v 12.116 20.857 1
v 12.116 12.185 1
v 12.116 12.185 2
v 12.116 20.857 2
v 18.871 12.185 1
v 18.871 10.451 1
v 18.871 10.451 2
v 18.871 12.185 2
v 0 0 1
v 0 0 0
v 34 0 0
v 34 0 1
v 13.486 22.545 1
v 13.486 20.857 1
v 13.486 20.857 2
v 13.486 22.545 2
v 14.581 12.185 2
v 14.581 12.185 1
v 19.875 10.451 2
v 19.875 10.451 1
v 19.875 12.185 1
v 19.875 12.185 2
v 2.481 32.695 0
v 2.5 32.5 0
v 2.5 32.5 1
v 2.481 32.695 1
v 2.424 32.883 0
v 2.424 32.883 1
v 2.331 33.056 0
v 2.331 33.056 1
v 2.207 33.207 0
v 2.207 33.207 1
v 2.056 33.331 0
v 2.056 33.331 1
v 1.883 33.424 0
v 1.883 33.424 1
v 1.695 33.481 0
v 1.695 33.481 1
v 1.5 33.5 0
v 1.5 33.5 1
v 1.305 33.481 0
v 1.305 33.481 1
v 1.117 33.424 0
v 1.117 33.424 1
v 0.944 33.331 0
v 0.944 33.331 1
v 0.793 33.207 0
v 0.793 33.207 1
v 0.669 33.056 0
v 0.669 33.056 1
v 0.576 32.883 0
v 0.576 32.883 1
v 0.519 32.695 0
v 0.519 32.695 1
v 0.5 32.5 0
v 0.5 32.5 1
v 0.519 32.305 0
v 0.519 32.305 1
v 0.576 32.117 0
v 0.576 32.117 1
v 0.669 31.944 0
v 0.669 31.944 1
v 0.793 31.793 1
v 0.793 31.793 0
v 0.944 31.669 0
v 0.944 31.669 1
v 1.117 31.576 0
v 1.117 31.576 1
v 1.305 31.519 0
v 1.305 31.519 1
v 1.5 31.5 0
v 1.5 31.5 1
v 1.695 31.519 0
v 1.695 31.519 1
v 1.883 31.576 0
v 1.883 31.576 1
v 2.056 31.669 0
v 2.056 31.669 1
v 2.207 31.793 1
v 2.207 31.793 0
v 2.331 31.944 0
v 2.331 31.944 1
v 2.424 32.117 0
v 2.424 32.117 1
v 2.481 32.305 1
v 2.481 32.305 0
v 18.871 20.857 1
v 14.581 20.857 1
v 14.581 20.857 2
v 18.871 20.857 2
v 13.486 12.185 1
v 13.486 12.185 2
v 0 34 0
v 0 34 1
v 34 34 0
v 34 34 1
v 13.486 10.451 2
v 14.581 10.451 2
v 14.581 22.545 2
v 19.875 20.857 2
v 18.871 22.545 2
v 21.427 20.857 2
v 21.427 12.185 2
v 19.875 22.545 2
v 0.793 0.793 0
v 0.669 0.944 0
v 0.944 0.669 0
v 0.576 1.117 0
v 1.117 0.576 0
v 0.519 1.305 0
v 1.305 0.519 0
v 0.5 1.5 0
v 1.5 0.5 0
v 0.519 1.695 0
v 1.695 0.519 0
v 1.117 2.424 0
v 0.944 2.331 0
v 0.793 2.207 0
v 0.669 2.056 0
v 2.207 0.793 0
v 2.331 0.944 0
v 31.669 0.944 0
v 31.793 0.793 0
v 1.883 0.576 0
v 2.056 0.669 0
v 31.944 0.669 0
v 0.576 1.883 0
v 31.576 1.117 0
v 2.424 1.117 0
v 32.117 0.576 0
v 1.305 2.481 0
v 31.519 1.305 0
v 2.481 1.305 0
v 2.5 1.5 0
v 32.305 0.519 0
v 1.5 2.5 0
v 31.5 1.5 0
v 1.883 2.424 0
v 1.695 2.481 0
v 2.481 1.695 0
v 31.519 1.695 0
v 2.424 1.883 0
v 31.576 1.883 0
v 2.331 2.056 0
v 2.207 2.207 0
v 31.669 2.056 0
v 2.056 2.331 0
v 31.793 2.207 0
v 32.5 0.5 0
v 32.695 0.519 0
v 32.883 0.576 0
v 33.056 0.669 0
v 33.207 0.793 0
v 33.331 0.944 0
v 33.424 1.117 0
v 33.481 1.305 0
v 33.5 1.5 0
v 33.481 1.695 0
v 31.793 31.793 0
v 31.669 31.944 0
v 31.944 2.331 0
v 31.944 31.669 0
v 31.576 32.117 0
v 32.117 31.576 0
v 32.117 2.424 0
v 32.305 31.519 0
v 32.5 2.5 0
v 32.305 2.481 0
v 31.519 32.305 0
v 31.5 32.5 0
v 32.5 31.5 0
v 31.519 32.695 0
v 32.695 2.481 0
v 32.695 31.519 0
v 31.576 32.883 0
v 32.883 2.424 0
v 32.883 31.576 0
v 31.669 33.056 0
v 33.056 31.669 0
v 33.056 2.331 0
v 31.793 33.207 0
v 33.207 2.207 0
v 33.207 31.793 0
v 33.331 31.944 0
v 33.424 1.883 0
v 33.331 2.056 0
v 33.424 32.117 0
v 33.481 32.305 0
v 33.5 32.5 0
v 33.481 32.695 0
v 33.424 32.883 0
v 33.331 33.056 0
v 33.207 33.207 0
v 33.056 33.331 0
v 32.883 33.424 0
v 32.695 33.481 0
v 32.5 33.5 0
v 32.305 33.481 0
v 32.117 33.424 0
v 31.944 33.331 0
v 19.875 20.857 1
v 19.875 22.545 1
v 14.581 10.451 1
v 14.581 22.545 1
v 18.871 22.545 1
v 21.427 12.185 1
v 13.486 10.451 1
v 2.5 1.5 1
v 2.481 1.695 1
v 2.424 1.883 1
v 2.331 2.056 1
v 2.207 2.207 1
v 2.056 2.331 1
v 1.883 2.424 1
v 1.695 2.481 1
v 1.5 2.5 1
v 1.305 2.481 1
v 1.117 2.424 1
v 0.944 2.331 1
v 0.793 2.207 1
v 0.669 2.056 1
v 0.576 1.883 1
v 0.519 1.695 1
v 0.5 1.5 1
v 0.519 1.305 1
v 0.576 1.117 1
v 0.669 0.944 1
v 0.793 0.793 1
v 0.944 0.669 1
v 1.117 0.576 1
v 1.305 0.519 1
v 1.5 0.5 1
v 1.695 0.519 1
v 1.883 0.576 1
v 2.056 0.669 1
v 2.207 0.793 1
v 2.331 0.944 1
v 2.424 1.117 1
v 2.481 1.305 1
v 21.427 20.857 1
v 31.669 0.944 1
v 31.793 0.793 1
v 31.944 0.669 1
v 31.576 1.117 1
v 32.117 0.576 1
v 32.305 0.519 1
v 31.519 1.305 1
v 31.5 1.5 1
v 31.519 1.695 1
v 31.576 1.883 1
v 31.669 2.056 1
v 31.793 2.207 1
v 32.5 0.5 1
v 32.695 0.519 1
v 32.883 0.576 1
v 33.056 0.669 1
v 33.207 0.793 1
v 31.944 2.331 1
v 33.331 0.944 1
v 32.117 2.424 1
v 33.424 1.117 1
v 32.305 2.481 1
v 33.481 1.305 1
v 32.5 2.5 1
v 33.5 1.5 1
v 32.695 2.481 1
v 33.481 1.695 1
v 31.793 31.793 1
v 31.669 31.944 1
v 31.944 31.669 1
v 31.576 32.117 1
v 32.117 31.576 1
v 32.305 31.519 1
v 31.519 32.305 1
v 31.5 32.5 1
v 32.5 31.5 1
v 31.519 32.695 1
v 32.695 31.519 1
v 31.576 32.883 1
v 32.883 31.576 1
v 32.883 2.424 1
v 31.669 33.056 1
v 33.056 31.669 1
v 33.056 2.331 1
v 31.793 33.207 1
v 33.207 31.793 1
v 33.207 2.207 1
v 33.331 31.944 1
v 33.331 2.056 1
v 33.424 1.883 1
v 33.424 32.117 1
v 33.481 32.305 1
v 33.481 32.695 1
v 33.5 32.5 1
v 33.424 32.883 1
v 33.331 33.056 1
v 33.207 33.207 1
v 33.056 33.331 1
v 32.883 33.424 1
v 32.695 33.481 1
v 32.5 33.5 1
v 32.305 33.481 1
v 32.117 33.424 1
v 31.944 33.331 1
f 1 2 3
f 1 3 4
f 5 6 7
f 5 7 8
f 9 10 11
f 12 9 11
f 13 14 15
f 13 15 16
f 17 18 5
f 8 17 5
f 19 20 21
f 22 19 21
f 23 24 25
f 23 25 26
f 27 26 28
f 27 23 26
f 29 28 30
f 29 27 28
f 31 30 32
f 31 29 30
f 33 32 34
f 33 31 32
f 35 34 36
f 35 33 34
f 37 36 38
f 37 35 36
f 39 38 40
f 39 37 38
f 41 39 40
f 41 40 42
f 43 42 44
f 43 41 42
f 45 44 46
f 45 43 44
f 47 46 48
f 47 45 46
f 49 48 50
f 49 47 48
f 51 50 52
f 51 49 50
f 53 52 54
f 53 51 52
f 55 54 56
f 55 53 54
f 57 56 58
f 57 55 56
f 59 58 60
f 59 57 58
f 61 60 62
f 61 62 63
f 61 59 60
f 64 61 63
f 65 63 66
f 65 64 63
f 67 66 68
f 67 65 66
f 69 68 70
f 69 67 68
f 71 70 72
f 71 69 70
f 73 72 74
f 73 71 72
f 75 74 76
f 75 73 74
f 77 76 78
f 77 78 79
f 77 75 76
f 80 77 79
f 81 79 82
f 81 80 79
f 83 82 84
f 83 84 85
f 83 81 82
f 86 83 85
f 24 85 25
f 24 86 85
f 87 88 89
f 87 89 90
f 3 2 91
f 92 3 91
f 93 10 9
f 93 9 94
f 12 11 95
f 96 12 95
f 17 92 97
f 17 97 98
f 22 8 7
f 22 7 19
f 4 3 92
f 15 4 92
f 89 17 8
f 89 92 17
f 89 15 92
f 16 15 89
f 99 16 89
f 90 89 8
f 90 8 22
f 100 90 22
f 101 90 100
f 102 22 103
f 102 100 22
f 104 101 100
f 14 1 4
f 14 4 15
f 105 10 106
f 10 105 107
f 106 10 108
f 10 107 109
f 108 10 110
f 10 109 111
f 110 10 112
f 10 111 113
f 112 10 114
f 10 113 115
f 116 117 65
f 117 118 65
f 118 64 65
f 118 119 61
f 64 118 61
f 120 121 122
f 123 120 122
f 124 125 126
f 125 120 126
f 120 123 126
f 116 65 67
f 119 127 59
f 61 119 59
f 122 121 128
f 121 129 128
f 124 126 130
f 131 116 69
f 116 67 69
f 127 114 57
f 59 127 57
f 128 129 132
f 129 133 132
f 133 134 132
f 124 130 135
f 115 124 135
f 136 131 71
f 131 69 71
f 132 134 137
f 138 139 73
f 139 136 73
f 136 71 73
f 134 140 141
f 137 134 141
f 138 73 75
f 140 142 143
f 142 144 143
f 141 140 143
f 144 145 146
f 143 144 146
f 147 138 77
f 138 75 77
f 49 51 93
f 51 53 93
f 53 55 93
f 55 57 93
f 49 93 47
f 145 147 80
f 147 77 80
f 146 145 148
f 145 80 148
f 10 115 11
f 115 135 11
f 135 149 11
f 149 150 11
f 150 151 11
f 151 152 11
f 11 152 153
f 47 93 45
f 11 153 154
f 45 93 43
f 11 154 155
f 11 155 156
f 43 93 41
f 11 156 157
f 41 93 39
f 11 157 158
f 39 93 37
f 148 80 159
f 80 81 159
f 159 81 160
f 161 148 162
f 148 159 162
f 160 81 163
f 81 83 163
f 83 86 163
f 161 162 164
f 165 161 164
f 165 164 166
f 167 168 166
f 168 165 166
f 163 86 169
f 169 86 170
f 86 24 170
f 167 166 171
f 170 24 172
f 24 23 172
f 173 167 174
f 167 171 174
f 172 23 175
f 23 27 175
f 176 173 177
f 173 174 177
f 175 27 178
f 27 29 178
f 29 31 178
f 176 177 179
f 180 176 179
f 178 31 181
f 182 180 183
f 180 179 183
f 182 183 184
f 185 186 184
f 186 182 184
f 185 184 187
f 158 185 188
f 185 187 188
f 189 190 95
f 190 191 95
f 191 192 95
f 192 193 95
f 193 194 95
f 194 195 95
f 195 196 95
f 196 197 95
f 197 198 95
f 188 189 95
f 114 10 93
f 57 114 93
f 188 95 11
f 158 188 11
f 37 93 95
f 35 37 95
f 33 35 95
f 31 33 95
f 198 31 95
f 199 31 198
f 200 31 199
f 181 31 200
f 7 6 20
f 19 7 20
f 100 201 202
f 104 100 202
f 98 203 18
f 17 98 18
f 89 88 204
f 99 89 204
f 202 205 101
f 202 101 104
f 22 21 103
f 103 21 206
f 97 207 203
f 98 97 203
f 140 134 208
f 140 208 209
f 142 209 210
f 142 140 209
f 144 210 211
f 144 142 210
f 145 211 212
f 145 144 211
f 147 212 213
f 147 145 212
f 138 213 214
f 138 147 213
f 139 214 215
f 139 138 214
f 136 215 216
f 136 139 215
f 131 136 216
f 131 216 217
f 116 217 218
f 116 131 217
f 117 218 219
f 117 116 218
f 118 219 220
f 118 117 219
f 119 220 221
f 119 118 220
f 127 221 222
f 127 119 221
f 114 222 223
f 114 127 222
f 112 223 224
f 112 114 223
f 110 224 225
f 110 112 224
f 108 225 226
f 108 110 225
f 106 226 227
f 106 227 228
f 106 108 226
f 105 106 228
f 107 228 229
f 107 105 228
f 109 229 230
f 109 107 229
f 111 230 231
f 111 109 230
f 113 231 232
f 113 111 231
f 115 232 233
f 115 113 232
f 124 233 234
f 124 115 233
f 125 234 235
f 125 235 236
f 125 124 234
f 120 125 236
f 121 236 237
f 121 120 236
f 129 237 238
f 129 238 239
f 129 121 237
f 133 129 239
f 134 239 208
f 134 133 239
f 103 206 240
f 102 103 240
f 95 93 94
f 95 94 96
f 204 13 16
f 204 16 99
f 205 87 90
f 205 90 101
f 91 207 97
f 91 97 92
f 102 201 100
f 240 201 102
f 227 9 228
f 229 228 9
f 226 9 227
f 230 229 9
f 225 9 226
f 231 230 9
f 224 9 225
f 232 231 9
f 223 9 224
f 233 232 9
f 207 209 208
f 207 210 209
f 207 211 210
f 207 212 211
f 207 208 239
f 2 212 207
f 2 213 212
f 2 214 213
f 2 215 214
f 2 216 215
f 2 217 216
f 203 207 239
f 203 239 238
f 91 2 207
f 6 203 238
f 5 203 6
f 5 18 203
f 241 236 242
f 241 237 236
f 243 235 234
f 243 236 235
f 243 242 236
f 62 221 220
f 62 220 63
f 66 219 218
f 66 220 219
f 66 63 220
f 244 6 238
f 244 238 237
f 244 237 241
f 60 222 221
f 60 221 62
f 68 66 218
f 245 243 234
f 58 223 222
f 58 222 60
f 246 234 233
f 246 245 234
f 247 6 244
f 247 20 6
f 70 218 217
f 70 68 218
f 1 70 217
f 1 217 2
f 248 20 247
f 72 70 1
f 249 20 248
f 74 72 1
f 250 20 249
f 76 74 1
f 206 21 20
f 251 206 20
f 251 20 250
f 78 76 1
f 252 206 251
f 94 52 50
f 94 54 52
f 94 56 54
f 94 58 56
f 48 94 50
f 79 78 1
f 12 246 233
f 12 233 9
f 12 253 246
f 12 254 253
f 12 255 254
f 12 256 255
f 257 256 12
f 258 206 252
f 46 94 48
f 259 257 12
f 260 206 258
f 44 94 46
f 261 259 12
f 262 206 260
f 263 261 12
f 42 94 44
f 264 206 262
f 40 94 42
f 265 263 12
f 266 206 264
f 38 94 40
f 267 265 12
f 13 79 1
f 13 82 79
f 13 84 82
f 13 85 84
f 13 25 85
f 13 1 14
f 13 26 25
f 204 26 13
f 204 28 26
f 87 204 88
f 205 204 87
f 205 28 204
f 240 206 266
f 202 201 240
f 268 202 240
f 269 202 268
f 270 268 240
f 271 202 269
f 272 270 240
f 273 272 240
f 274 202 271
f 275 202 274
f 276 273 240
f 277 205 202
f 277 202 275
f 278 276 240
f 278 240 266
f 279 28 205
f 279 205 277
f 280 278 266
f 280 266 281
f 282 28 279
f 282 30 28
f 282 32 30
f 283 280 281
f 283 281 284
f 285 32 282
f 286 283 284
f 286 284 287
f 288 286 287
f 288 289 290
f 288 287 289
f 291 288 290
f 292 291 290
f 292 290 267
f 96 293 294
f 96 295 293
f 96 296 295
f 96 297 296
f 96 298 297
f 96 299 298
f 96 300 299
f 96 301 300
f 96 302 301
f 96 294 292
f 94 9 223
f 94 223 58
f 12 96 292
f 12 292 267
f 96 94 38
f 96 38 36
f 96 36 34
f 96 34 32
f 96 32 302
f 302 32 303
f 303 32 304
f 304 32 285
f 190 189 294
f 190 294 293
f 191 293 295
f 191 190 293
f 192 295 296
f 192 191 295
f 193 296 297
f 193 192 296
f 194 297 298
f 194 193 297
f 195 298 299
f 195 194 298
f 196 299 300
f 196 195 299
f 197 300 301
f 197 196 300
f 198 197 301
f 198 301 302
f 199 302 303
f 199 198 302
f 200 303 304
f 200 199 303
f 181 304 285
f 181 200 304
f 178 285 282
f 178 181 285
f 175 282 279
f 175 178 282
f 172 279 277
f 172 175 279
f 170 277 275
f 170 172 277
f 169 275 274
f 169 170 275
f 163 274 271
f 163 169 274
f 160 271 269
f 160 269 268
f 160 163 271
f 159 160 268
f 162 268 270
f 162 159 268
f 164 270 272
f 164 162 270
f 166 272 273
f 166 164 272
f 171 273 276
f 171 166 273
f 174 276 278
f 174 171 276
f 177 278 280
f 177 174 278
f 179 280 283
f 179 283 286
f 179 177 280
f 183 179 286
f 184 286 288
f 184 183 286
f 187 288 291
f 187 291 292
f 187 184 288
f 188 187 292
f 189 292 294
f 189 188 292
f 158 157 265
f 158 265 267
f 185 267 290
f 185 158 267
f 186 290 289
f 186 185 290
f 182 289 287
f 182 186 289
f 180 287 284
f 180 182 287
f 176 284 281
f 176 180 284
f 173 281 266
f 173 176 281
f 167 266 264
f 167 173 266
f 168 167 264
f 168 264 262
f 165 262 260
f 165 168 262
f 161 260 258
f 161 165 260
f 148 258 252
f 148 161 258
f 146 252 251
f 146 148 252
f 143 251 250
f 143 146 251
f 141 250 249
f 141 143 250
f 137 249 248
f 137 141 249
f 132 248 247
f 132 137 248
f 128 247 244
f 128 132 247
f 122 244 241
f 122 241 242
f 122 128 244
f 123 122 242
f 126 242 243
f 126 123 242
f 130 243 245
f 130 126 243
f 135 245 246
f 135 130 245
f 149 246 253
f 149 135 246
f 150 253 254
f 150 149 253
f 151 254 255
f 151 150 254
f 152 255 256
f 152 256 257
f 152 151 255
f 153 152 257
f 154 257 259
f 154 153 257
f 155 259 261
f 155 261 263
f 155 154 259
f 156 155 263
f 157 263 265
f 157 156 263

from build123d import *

# Parameters (mm, degrees)
CROQUIS1_W              = 34
CROQUIS1_H              = 34
CROQUIS1_R              = 1
SALIENTE_EXTRUIR1_DEPTH = 1
CROQUIS2_W              = 9.310717014
CROQUIS2_H              = 8.671746239
CROQUIS2_W_2            = 1.095378472
CROQUIS2_H_2            = 1.688708478
CROQUIS2_W_3            = 1.004096933
CROQUIS2_H_3            = 1.734349248
SALIENTE_EXTRUIR2_DEPTH = 1


with BuildPart() as part:
    # Croquis1 → Saliente-Extruir1 (new body)
    with BuildSketch(Plane.XY):
        with Locations((17, 17)):
            Rectangle(CROQUIS1_W, CROQUIS1_H)
        with Locations((1.5, 32.5)):
            Circle(CROQUIS1_R, mode=Mode.SUBTRACT)
        with Locations((32.5, 32.5)):
            Circle(CROQUIS1_R, mode=Mode.SUBTRACT)
        with Locations((1.5, 1.5)):
            Circle(CROQUIS1_R, mode=Mode.SUBTRACT)
        with Locations((32.5, 1.5)):
            Circle(CROQUIS1_R, mode=Mode.SUBTRACT)
    extrude(amount=SALIENTE_EXTRUIR1_DEPTH)

    # Croquis2 → Saliente-Extruir2 (add)
    with BuildSketch(Plane.XY.offset(1)):
        with Locations((16.771796152, 16.520771918)):
            Rectangle(CROQUIS2_W, CROQUIS2_H)
        with Locations((14.033349971, 21.700999277)):
            Rectangle(CROQUIS2_W_2, CROQUIS2_H_2)
        with Locations((19.373320023, 21.700999277)):
            Rectangle(CROQUIS2_W_3, CROQUIS2_H_2)
        with Locations((14.033349971, 11.317724175)):
            Rectangle(CROQUIS2_W_2, CROQUIS2_H_3)
        with Locations((19.373320023, 11.317724175)):
            Rectangle(CROQUIS2_W_3, CROQUIS2_H_3)
    extrude(amount=SALIENTE_EXTRUIR2_DEPTH)


solid = part.part
